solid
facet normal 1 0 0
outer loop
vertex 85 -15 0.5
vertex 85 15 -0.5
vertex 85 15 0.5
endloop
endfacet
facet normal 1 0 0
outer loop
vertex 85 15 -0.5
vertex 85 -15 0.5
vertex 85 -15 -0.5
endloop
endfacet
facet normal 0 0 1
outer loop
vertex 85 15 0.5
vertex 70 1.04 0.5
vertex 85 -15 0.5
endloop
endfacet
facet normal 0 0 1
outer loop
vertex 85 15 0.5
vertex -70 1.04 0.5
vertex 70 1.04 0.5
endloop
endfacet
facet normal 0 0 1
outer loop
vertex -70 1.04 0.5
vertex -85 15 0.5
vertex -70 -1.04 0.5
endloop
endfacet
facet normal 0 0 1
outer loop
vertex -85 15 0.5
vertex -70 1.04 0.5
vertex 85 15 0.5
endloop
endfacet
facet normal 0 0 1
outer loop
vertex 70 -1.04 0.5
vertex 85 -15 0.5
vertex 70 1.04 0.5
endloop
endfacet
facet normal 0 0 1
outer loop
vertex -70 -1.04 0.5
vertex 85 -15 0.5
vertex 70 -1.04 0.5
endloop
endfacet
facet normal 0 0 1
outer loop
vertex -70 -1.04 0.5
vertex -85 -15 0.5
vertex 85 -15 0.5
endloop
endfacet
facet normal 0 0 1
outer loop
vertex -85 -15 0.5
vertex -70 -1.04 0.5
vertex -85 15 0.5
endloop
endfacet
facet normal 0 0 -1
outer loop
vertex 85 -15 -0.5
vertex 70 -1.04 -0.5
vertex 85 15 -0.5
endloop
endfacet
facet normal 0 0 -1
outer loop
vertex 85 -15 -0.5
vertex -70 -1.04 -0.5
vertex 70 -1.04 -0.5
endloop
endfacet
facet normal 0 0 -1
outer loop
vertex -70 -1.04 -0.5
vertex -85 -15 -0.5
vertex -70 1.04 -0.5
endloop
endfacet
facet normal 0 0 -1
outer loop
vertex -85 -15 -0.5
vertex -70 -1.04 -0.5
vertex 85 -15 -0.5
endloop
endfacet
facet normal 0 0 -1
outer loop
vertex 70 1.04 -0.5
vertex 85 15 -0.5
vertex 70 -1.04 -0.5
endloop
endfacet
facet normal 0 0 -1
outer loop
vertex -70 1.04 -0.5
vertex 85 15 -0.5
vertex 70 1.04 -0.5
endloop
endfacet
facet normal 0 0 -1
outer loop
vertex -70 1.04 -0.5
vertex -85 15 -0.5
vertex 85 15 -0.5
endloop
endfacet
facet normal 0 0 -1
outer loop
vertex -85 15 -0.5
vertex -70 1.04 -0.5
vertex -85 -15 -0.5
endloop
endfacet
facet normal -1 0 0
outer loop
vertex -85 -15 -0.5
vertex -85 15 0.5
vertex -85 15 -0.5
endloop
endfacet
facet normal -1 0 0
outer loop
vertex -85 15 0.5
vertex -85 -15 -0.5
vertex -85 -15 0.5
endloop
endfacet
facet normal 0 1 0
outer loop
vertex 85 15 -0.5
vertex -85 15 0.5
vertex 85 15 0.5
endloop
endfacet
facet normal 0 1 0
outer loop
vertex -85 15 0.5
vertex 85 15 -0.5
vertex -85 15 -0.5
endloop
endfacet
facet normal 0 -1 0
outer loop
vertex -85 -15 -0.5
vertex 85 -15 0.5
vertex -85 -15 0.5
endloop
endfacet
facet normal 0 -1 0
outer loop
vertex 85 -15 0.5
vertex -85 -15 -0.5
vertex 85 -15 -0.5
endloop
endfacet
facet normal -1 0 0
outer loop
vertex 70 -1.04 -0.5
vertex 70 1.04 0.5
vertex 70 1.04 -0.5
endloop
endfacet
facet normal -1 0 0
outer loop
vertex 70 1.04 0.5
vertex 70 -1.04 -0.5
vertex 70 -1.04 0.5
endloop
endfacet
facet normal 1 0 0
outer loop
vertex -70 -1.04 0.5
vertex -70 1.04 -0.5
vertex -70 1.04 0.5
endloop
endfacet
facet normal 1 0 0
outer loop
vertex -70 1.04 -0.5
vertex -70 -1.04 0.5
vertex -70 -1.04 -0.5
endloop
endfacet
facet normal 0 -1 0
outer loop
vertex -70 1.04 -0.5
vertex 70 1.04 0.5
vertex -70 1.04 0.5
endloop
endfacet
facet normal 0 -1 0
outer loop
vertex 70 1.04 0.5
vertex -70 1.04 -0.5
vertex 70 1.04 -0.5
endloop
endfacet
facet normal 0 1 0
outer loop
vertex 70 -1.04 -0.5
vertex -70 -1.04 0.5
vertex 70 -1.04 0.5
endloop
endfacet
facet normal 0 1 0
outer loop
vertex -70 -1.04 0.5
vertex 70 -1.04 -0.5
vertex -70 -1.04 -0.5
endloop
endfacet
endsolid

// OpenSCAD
difference() {
  cube([170,30,1.0],center=true);
  cube([140,2.08,1.5],center=true);
}
